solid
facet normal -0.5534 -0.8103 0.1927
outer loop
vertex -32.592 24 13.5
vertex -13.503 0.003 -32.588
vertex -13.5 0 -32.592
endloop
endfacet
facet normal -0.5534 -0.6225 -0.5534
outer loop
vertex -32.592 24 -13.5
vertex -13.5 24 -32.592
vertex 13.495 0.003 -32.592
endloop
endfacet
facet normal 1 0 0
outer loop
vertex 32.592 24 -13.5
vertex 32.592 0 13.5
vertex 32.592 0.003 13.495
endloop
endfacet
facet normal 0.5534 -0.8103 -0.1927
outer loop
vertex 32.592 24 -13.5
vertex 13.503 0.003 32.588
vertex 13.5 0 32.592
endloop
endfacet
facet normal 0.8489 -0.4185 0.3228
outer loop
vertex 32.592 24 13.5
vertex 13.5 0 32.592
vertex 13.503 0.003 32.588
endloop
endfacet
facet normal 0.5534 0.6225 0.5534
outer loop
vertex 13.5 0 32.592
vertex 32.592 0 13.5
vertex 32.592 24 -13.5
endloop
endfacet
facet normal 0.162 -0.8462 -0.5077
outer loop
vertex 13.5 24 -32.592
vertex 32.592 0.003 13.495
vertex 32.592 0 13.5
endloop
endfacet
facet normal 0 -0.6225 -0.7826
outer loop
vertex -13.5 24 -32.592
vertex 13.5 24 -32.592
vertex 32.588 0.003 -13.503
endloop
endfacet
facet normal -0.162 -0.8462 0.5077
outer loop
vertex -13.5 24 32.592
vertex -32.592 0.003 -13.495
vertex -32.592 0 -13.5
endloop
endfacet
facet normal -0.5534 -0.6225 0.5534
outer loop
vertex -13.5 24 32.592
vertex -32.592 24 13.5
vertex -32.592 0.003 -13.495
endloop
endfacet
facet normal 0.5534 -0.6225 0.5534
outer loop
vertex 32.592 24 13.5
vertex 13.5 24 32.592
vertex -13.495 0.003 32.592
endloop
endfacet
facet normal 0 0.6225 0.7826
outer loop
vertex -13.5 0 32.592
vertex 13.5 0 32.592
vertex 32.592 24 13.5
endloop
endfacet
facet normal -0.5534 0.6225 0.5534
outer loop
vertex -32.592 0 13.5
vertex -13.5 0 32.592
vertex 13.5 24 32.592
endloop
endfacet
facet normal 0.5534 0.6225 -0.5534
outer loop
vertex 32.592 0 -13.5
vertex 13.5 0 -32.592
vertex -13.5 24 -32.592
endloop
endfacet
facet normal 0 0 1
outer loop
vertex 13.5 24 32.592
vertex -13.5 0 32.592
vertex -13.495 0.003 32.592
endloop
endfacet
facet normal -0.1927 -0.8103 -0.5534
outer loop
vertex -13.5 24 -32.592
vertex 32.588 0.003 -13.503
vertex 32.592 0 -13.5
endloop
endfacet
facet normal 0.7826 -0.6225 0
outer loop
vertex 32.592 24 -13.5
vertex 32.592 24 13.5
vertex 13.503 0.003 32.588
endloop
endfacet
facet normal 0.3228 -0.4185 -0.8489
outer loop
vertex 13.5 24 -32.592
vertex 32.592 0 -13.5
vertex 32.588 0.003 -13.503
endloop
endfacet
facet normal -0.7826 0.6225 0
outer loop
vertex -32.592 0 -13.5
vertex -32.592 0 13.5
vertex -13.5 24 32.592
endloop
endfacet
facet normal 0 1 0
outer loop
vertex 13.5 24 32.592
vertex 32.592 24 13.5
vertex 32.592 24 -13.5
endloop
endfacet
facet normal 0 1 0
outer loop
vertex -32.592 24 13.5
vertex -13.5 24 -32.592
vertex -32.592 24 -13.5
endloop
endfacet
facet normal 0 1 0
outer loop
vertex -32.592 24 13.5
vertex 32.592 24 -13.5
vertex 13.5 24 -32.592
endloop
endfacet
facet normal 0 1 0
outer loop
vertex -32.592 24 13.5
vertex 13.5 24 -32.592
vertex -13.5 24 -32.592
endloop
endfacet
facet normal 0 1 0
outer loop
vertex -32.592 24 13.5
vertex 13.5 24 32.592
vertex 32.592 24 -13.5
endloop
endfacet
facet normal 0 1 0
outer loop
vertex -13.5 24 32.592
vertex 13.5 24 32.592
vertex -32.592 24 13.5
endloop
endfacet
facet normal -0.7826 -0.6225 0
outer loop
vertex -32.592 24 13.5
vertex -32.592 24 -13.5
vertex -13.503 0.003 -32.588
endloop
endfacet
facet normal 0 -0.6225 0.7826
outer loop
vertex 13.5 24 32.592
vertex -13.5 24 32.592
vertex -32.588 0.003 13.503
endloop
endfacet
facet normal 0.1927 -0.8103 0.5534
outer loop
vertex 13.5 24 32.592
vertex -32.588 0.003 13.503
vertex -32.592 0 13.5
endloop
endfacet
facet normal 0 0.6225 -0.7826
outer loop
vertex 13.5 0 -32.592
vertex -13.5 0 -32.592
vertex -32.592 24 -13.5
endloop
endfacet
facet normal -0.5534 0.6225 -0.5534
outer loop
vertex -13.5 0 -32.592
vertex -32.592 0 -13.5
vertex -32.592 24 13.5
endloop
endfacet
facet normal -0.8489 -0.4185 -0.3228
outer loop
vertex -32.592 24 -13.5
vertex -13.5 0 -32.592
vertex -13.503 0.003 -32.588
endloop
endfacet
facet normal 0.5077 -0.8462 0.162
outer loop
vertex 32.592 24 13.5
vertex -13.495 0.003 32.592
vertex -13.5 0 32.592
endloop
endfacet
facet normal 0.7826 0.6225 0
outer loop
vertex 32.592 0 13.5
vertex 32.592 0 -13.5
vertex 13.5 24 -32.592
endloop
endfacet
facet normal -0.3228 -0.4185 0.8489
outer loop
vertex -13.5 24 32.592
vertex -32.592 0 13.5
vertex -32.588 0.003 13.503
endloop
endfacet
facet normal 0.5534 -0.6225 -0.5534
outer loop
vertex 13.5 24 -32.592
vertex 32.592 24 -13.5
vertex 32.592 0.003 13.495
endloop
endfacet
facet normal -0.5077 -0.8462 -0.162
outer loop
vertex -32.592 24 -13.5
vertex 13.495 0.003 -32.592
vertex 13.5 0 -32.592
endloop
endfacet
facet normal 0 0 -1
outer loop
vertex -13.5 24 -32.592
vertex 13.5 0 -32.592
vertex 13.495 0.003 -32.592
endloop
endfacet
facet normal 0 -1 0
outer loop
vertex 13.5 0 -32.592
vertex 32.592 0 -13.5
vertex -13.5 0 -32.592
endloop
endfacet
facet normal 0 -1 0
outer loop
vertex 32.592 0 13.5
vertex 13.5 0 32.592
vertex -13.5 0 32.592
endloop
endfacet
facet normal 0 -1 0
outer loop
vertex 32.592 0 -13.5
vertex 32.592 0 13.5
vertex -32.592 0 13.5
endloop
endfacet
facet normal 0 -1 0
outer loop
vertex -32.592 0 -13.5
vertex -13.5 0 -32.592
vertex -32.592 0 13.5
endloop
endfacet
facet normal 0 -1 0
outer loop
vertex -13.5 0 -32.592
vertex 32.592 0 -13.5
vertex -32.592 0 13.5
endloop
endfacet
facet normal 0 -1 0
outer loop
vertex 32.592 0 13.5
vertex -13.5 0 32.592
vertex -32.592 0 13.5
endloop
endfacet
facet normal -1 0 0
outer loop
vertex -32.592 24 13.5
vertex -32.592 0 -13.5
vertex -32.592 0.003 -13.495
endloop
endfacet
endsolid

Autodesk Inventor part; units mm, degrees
sketch "스케치1" plane through (0, 0, 0) normal (0, 1, 0) x (-1, 0, 0)
  line L0 (-31.9919, 13.2515) -> (-13.2515, 31.9919)
  line L1 (-13.2515, 31.9919) -> (13.2515, 31.9919)
  line L2 (13.2515, 31.9919) -> (31.9919, 13.2515)
  line L3 (31.9919, 13.2515) -> (31.9919, -13.2515)
  line L4 (31.9919, -13.2515) -> (13.2515, -31.9919)
  line L5 (13.2515, -31.9919) -> (-13.2515, -31.9919)
  line L6 (-13.2515, -31.9919) -> (-31.9919, -13.2515)
  line L7 (-31.9919, -13.2515) -> (-31.9919, 13.2515)
  line L8 (-13.5, 32.5919) -> (13.5, 32.5919)
  line L9 (13.5, 32.5919) -> (32.5919, 13.5)
  line L10 (32.5919, 13.5) -> (32.5919, -13.5)
  line L11 (32.5919, -13.5) -> (13.5, -32.5919)
  line L12 (13.5, -32.5919) -> (-13.5, -32.5919)
  line L13 (-13.5, -32.5919) -> (-32.5919, -13.5)
  line L14 (-32.5919, -13.5) -> (-32.5919, 13.5)
  line L15 (-32.5919, 13.5) -> (-13.5, 32.5919)
  point P0 (0, 0)
  point P1 (0, 0)
  point P2 (0, 0)
  dimension "d2" = 0.6
  dimension "d118" = 27
extrude "돌출2" add sketch "스케치1" along normal blind 24 contours L0 L1 L2 L3 L4 L5 L6 L7 | L8 L9 L10 L11 L12 L13 L14 L15
ref_plane "작업 평면24" through (-13.5, 24, -32.5919) normal (0, -0.622543, -0.7825856) x (1, 0, 0)
sketch "스케치27" plane through (13.5, 0, -32.5919) normal (0, 0, -1) x (-1, 0, 0)
  line L0 (27, 24) -> (46.0919, 24) projected
  line L1 (0, 24) -> (27, 24) projected
  line L2 (27, 24) -> (0, 24)
  line L3 (0, 24) -> (-19.0919, 0)
  line L4 (-19.0919, 0) -> (27, 24)
  line L5 (0, 0) -> (0, 24) projected
  line L6 (0, 24) -> (0, 9.9411)
  point P0 (13.5, 0)
extrude "돌출22" cut sketch "스케치27" against normal up to surface surface through (-13.5, 24, -32.5919) normal (0, -0.622543, -0.7825856)
ref_plane "작업 평면26" through (32.5919, 0, -13.5) normal (0.5533716, 0.622543, -0.5533716) x (-0.7071068, 0, -0.7071068)
sketch "스케치28" plane through (13.5, 0, -32.5919) normal (0.7071068, 0, -0.7071068) x (-0.7071068, 0, -0.7071068)
  line L0 (-27.3314, 0) -> (-27.3314, 12) projected
  line L1 (19.0919, 0) -> (0, 0) projected
  line L2 (-27, 0) -> (0, 0)
  line L3 (19.0919, 0) -> (19.0919, 24) projected
  line L4 (0, 0) -> (19.0919, 24)
  line L5 (19.0919, 24) -> (-27, 0)
  point P0 (-13.5, 0)
  point P1 (-27.3314, 12)
extrude "돌출23" cut sketch "스케치28" against normal up to surface contours L2 L5 L4 surface through (32.5919, 0, -13.5) normal (0.5533716, 0.622543, -0.5533716)
pattern_circular "원형 패턴5" count 8 over 360 about axis through (0, -10, 0) along (0, 1, 0) of "돌출23", "돌출22"
ref_plane "작업 평면27" through (0, 12, 0) normal (0, 1, 0) x (1, 0, 0)
properties part number "팔각형 OV-PAM 층 한개"
